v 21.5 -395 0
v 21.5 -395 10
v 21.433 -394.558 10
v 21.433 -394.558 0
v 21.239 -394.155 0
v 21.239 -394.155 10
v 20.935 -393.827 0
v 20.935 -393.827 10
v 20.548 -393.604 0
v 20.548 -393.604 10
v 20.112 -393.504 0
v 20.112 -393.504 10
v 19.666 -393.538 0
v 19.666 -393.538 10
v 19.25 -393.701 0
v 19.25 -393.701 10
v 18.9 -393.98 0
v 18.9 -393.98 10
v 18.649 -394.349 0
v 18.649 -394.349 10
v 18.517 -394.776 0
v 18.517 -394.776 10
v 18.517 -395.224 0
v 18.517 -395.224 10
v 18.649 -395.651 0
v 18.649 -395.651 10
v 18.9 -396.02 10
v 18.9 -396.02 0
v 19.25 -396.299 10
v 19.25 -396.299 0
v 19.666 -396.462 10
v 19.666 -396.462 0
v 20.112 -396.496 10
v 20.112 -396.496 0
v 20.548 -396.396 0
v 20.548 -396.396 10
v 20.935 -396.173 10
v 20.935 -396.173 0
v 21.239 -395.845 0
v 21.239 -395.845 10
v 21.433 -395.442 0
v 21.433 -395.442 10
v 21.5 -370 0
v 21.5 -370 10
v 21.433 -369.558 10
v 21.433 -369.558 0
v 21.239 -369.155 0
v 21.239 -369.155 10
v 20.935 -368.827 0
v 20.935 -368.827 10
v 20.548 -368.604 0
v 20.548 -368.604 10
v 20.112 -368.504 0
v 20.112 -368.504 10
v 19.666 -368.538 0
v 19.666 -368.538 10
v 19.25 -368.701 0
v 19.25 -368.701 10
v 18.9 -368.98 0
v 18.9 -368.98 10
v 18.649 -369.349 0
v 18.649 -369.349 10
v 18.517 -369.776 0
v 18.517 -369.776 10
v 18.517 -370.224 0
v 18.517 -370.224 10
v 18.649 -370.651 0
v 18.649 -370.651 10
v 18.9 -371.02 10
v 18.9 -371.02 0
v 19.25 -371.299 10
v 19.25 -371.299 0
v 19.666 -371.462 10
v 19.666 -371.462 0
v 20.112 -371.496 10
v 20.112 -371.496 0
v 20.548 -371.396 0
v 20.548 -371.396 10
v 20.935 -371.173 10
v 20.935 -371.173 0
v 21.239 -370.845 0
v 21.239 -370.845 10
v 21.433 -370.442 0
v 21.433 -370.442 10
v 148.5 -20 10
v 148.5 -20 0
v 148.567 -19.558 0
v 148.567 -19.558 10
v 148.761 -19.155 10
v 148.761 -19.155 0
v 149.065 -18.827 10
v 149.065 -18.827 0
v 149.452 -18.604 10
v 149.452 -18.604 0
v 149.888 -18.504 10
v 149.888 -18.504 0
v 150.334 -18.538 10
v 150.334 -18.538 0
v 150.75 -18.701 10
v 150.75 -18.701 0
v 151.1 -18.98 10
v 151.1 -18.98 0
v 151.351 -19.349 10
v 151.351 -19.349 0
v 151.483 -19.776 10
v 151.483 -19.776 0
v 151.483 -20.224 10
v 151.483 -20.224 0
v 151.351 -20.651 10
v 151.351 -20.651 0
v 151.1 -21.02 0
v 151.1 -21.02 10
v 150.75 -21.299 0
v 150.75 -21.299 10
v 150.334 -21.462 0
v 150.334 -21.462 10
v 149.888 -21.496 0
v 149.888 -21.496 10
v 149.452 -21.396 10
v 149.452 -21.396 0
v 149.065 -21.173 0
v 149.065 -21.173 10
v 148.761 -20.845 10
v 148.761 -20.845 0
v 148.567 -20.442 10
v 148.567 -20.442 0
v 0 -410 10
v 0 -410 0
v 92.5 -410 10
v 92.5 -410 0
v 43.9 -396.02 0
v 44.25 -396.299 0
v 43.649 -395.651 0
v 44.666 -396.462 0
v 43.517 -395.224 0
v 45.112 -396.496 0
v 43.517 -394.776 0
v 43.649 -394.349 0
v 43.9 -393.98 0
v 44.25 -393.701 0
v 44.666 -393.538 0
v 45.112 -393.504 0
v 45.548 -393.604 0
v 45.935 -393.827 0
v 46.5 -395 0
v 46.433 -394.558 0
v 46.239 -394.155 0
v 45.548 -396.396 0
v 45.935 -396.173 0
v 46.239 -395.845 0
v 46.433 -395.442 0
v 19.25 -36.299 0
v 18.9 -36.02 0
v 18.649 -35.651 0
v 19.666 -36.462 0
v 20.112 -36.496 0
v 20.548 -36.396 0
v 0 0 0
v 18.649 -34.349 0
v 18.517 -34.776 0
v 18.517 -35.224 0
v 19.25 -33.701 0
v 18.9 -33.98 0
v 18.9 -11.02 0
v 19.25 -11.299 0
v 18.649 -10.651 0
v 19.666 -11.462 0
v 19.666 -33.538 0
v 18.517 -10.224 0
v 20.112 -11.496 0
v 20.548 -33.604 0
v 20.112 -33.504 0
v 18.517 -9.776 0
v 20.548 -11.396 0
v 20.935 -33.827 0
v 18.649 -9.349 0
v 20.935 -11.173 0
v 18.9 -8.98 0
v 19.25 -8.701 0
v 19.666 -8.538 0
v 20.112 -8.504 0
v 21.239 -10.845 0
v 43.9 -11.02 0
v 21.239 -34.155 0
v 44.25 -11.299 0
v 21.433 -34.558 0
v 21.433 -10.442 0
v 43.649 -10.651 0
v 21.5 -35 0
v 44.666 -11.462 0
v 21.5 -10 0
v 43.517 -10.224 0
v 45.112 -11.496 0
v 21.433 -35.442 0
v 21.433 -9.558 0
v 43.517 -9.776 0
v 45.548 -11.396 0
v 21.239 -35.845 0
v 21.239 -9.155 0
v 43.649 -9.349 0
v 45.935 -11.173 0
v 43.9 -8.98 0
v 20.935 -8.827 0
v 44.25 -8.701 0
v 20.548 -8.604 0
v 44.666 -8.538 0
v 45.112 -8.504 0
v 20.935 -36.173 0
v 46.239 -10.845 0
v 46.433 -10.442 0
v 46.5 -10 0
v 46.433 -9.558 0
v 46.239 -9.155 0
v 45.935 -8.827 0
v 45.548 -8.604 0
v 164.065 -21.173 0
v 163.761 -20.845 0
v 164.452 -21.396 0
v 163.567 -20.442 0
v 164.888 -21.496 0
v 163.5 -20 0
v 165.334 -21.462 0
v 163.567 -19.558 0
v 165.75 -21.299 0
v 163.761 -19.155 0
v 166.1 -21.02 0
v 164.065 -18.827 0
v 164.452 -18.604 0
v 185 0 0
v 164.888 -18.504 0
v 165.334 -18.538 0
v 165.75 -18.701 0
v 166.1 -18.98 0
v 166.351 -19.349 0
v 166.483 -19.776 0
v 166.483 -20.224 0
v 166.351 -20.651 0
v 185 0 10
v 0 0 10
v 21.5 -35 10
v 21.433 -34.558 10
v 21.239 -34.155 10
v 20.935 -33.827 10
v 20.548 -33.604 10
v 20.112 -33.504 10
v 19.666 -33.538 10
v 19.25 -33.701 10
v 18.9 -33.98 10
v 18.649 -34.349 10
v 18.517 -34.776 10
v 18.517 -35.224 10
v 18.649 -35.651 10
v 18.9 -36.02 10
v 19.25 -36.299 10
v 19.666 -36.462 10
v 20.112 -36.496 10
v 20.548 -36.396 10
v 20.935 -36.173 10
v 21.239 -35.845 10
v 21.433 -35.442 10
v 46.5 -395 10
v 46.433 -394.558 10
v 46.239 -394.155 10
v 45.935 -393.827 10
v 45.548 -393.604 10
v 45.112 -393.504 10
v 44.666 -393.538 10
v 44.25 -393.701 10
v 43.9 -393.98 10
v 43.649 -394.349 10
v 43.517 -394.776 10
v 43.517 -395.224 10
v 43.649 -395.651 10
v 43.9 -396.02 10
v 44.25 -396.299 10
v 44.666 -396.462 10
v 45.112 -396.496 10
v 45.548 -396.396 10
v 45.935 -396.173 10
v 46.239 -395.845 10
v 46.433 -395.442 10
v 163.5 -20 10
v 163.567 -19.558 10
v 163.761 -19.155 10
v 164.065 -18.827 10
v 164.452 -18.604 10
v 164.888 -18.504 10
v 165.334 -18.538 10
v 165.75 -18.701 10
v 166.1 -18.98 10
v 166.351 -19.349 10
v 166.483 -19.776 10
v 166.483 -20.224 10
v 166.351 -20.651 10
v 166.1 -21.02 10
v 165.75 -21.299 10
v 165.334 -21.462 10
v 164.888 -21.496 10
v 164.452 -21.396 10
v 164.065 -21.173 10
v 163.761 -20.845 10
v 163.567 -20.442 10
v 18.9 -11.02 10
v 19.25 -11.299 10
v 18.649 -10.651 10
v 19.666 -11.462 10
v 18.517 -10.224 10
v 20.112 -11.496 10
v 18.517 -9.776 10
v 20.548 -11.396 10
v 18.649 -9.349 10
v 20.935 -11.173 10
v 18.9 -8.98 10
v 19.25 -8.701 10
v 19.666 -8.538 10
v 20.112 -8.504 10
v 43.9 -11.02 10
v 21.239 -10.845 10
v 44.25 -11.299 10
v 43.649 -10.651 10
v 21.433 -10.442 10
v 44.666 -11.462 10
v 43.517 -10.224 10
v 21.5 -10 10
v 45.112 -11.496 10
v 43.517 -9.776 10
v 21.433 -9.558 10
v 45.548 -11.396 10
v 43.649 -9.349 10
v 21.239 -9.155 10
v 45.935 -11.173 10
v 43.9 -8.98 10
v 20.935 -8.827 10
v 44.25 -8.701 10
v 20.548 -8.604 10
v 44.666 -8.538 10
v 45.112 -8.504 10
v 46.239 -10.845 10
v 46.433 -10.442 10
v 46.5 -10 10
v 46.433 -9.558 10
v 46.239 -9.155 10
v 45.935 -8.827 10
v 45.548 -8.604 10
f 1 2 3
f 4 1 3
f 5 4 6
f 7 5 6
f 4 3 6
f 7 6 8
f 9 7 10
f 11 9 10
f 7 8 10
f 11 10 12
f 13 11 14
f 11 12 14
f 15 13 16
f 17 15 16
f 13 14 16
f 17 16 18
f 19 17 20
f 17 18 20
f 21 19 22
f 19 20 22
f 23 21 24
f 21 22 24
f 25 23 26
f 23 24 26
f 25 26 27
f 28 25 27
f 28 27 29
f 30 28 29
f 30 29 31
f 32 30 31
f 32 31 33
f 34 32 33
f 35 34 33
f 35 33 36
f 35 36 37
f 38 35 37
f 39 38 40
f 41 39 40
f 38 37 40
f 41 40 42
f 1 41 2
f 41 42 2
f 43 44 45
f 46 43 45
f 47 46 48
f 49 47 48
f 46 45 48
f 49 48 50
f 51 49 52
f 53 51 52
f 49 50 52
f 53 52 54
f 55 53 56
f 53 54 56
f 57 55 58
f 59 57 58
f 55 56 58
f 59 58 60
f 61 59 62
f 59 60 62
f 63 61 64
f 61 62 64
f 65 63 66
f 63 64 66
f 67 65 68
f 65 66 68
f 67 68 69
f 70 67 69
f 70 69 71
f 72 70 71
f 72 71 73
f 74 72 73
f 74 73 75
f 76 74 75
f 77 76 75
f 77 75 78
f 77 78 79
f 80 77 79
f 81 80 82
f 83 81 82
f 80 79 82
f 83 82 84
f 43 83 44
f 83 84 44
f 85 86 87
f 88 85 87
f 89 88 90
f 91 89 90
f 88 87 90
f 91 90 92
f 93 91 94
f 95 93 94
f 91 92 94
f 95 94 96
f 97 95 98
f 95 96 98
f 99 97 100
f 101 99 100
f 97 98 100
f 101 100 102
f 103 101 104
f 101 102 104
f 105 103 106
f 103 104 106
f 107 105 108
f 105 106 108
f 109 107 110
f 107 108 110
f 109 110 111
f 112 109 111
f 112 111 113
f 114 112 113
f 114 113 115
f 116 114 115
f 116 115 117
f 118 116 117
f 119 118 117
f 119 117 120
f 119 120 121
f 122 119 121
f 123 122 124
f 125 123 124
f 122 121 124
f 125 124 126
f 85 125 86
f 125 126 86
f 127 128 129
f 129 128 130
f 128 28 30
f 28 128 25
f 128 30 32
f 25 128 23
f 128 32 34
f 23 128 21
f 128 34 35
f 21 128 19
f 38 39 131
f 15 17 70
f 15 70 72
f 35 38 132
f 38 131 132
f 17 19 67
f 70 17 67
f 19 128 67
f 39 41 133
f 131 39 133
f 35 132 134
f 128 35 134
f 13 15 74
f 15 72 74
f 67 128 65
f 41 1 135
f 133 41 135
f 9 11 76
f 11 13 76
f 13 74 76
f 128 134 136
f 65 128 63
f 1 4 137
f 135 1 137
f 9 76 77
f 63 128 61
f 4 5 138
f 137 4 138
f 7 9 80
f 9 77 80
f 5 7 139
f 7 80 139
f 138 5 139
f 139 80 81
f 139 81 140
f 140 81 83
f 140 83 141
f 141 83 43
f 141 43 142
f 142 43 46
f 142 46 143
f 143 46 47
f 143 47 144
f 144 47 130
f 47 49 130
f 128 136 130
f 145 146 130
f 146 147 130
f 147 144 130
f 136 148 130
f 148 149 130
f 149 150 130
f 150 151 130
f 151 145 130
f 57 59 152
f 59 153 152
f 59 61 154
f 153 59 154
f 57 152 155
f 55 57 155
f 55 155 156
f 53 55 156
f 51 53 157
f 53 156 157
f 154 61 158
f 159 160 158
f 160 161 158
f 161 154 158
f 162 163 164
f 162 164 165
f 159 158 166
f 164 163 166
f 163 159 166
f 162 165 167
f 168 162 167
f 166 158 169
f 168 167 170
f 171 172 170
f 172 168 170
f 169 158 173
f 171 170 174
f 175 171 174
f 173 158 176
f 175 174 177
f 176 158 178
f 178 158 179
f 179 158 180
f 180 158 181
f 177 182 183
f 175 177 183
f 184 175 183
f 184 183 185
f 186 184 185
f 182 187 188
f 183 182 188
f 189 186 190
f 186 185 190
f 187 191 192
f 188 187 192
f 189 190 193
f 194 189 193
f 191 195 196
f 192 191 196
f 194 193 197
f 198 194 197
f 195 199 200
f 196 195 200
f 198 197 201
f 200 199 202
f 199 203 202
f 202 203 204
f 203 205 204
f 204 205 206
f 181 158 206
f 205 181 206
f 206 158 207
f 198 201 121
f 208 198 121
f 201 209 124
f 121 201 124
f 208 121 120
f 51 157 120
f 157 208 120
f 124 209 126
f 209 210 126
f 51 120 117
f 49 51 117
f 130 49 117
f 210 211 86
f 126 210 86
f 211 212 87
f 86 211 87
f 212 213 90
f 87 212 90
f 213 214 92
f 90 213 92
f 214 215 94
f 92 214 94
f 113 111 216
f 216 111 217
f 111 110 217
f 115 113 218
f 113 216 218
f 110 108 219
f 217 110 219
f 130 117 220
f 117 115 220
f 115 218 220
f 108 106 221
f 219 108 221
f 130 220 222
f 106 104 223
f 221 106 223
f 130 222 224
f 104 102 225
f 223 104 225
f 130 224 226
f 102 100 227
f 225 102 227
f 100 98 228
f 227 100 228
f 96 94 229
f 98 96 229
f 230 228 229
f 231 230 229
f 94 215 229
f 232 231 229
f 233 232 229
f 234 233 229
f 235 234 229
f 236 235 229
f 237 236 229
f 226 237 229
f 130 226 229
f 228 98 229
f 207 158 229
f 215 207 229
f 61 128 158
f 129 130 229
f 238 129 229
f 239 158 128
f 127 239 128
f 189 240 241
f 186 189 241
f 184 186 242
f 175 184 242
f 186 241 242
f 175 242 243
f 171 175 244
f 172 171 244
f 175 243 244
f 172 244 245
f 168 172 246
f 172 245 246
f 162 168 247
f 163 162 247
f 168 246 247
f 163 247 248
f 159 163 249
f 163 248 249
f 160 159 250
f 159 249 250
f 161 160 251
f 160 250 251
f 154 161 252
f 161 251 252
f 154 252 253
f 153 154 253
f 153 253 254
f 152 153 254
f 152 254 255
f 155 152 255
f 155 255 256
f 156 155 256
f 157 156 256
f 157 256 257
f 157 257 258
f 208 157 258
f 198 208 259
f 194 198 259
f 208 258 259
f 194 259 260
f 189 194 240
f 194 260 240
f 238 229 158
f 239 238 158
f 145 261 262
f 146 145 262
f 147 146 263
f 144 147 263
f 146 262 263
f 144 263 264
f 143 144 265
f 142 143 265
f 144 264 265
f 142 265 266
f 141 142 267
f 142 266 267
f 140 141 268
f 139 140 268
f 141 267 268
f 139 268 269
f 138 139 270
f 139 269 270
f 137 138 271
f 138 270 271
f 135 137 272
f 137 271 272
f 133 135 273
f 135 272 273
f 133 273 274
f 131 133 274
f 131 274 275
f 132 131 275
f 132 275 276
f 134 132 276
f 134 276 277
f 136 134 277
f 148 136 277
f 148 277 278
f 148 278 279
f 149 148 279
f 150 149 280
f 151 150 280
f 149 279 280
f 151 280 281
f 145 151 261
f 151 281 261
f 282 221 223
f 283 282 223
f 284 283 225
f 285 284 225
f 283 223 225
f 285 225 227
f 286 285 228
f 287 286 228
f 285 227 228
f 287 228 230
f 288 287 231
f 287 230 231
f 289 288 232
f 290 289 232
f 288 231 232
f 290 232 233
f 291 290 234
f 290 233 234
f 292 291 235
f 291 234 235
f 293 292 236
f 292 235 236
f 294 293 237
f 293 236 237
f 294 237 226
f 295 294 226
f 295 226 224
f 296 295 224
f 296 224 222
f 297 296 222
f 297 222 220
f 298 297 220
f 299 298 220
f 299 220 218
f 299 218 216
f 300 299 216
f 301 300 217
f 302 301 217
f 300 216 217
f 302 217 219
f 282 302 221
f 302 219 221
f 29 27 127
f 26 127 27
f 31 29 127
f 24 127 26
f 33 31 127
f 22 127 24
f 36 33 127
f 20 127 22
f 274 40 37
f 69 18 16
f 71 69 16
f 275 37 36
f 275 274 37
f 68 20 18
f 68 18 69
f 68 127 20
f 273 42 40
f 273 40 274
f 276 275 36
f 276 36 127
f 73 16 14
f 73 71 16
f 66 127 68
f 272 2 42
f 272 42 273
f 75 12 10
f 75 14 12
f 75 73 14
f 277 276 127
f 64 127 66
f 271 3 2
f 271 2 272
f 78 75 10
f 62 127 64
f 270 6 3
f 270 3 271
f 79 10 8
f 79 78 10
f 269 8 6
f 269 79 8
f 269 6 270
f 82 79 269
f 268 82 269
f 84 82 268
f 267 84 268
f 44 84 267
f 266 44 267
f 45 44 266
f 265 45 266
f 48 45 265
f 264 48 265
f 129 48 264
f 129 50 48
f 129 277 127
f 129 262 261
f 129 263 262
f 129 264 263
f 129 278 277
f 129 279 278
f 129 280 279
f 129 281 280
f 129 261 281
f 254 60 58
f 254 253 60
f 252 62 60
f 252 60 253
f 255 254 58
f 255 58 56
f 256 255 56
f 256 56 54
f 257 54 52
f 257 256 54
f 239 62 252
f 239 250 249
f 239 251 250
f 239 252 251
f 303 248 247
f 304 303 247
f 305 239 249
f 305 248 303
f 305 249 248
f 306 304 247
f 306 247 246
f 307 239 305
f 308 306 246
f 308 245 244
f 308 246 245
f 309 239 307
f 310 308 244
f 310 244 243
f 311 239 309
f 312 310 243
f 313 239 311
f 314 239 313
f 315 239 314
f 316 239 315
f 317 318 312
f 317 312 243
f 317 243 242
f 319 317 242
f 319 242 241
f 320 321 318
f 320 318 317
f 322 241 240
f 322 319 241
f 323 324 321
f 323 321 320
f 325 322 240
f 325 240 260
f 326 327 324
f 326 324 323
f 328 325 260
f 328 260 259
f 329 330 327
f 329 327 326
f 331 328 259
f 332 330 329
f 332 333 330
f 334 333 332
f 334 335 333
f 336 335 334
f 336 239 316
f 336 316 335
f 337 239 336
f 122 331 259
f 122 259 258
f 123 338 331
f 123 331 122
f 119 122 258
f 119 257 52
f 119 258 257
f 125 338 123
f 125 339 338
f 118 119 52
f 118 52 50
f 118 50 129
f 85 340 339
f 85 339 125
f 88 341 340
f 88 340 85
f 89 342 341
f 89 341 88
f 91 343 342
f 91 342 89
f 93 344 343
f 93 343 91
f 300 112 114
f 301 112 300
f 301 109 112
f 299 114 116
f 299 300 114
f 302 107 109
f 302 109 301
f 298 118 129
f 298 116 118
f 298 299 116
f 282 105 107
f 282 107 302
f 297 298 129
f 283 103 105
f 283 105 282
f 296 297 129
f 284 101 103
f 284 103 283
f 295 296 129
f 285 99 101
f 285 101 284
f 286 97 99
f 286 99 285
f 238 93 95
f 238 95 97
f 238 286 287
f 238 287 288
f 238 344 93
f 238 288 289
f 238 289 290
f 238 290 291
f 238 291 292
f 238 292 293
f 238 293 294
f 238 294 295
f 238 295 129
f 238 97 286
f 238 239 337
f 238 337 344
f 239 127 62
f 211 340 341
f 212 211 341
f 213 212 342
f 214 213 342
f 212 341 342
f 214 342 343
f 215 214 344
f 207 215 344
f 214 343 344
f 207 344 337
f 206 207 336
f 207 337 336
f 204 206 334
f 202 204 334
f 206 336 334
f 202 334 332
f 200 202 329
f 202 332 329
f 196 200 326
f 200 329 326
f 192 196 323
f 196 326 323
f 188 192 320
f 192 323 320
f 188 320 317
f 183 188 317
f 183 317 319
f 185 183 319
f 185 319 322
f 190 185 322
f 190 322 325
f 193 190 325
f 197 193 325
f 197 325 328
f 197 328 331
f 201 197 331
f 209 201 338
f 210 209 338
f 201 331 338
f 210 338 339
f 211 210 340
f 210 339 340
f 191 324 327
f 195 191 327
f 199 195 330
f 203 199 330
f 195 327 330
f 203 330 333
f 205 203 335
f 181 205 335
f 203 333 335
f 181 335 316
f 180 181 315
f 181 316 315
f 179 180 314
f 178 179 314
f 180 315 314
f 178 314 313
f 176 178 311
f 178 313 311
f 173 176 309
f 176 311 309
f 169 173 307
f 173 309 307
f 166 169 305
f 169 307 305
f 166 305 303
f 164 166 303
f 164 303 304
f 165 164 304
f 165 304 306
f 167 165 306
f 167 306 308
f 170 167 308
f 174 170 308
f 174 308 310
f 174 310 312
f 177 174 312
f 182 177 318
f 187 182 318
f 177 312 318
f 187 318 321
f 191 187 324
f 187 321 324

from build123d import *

# Parameters (mm, degrees)
EXTRUDE_1_DEPTH     = 10
SKETCH_2_R          = 1.5
CUT_EXTRUDE_1_DEPTH = 10
SKETCH_3_R          = 1.5
CUT_EXTRUDE_2_DEPTH = 10


with BuildPart() as part:
    # 草图1 → 凸台-拉伸1 (new body)
    with BuildSketch(Plane.XY):
        Polygon((185, 0), (0, 0), (0, -400), (0, -410), (92.5, -410), align=None)
    extrude(amount=EXTRUDE_1_DEPTH)

    # 草图2 → 切除-拉伸1 (cut)
    with BuildSketch(Plane.XY.offset(10)):
        with Locations((20, -35)):
            Circle(SKETCH_2_R)
        with Locations((45, -10)):
            Circle(SKETCH_2_R)
        with Locations((20, -10)):
            Circle(SKETCH_2_R)
        with Locations((45, -395)):
            Circle(SKETCH_2_R)
        with Locations((20, -395)):
            Circle(SKETCH_2_R)
        with Locations((20, -370)):
            Circle(SKETCH_2_R)
    extrude(amount=-CUT_EXTRUDE_1_DEPTH, mode=Mode.SUBTRACT)

    # 草图3 → 切除-拉伸2 (cut)
    with BuildSketch(Plane(origin=(0, 0, 0), x_dir=(-1, 0, 0), z_dir=(0, 0, -1))):
        with Locations((-165, -20)):
            Circle(SKETCH_3_R)
        with Locations((-150, -20)):
            Circle(SKETCH_3_R)
    extrude(amount=-CUT_EXTRUDE_2_DEPTH, mode=Mode.SUBTRACT)


solid = part.part
